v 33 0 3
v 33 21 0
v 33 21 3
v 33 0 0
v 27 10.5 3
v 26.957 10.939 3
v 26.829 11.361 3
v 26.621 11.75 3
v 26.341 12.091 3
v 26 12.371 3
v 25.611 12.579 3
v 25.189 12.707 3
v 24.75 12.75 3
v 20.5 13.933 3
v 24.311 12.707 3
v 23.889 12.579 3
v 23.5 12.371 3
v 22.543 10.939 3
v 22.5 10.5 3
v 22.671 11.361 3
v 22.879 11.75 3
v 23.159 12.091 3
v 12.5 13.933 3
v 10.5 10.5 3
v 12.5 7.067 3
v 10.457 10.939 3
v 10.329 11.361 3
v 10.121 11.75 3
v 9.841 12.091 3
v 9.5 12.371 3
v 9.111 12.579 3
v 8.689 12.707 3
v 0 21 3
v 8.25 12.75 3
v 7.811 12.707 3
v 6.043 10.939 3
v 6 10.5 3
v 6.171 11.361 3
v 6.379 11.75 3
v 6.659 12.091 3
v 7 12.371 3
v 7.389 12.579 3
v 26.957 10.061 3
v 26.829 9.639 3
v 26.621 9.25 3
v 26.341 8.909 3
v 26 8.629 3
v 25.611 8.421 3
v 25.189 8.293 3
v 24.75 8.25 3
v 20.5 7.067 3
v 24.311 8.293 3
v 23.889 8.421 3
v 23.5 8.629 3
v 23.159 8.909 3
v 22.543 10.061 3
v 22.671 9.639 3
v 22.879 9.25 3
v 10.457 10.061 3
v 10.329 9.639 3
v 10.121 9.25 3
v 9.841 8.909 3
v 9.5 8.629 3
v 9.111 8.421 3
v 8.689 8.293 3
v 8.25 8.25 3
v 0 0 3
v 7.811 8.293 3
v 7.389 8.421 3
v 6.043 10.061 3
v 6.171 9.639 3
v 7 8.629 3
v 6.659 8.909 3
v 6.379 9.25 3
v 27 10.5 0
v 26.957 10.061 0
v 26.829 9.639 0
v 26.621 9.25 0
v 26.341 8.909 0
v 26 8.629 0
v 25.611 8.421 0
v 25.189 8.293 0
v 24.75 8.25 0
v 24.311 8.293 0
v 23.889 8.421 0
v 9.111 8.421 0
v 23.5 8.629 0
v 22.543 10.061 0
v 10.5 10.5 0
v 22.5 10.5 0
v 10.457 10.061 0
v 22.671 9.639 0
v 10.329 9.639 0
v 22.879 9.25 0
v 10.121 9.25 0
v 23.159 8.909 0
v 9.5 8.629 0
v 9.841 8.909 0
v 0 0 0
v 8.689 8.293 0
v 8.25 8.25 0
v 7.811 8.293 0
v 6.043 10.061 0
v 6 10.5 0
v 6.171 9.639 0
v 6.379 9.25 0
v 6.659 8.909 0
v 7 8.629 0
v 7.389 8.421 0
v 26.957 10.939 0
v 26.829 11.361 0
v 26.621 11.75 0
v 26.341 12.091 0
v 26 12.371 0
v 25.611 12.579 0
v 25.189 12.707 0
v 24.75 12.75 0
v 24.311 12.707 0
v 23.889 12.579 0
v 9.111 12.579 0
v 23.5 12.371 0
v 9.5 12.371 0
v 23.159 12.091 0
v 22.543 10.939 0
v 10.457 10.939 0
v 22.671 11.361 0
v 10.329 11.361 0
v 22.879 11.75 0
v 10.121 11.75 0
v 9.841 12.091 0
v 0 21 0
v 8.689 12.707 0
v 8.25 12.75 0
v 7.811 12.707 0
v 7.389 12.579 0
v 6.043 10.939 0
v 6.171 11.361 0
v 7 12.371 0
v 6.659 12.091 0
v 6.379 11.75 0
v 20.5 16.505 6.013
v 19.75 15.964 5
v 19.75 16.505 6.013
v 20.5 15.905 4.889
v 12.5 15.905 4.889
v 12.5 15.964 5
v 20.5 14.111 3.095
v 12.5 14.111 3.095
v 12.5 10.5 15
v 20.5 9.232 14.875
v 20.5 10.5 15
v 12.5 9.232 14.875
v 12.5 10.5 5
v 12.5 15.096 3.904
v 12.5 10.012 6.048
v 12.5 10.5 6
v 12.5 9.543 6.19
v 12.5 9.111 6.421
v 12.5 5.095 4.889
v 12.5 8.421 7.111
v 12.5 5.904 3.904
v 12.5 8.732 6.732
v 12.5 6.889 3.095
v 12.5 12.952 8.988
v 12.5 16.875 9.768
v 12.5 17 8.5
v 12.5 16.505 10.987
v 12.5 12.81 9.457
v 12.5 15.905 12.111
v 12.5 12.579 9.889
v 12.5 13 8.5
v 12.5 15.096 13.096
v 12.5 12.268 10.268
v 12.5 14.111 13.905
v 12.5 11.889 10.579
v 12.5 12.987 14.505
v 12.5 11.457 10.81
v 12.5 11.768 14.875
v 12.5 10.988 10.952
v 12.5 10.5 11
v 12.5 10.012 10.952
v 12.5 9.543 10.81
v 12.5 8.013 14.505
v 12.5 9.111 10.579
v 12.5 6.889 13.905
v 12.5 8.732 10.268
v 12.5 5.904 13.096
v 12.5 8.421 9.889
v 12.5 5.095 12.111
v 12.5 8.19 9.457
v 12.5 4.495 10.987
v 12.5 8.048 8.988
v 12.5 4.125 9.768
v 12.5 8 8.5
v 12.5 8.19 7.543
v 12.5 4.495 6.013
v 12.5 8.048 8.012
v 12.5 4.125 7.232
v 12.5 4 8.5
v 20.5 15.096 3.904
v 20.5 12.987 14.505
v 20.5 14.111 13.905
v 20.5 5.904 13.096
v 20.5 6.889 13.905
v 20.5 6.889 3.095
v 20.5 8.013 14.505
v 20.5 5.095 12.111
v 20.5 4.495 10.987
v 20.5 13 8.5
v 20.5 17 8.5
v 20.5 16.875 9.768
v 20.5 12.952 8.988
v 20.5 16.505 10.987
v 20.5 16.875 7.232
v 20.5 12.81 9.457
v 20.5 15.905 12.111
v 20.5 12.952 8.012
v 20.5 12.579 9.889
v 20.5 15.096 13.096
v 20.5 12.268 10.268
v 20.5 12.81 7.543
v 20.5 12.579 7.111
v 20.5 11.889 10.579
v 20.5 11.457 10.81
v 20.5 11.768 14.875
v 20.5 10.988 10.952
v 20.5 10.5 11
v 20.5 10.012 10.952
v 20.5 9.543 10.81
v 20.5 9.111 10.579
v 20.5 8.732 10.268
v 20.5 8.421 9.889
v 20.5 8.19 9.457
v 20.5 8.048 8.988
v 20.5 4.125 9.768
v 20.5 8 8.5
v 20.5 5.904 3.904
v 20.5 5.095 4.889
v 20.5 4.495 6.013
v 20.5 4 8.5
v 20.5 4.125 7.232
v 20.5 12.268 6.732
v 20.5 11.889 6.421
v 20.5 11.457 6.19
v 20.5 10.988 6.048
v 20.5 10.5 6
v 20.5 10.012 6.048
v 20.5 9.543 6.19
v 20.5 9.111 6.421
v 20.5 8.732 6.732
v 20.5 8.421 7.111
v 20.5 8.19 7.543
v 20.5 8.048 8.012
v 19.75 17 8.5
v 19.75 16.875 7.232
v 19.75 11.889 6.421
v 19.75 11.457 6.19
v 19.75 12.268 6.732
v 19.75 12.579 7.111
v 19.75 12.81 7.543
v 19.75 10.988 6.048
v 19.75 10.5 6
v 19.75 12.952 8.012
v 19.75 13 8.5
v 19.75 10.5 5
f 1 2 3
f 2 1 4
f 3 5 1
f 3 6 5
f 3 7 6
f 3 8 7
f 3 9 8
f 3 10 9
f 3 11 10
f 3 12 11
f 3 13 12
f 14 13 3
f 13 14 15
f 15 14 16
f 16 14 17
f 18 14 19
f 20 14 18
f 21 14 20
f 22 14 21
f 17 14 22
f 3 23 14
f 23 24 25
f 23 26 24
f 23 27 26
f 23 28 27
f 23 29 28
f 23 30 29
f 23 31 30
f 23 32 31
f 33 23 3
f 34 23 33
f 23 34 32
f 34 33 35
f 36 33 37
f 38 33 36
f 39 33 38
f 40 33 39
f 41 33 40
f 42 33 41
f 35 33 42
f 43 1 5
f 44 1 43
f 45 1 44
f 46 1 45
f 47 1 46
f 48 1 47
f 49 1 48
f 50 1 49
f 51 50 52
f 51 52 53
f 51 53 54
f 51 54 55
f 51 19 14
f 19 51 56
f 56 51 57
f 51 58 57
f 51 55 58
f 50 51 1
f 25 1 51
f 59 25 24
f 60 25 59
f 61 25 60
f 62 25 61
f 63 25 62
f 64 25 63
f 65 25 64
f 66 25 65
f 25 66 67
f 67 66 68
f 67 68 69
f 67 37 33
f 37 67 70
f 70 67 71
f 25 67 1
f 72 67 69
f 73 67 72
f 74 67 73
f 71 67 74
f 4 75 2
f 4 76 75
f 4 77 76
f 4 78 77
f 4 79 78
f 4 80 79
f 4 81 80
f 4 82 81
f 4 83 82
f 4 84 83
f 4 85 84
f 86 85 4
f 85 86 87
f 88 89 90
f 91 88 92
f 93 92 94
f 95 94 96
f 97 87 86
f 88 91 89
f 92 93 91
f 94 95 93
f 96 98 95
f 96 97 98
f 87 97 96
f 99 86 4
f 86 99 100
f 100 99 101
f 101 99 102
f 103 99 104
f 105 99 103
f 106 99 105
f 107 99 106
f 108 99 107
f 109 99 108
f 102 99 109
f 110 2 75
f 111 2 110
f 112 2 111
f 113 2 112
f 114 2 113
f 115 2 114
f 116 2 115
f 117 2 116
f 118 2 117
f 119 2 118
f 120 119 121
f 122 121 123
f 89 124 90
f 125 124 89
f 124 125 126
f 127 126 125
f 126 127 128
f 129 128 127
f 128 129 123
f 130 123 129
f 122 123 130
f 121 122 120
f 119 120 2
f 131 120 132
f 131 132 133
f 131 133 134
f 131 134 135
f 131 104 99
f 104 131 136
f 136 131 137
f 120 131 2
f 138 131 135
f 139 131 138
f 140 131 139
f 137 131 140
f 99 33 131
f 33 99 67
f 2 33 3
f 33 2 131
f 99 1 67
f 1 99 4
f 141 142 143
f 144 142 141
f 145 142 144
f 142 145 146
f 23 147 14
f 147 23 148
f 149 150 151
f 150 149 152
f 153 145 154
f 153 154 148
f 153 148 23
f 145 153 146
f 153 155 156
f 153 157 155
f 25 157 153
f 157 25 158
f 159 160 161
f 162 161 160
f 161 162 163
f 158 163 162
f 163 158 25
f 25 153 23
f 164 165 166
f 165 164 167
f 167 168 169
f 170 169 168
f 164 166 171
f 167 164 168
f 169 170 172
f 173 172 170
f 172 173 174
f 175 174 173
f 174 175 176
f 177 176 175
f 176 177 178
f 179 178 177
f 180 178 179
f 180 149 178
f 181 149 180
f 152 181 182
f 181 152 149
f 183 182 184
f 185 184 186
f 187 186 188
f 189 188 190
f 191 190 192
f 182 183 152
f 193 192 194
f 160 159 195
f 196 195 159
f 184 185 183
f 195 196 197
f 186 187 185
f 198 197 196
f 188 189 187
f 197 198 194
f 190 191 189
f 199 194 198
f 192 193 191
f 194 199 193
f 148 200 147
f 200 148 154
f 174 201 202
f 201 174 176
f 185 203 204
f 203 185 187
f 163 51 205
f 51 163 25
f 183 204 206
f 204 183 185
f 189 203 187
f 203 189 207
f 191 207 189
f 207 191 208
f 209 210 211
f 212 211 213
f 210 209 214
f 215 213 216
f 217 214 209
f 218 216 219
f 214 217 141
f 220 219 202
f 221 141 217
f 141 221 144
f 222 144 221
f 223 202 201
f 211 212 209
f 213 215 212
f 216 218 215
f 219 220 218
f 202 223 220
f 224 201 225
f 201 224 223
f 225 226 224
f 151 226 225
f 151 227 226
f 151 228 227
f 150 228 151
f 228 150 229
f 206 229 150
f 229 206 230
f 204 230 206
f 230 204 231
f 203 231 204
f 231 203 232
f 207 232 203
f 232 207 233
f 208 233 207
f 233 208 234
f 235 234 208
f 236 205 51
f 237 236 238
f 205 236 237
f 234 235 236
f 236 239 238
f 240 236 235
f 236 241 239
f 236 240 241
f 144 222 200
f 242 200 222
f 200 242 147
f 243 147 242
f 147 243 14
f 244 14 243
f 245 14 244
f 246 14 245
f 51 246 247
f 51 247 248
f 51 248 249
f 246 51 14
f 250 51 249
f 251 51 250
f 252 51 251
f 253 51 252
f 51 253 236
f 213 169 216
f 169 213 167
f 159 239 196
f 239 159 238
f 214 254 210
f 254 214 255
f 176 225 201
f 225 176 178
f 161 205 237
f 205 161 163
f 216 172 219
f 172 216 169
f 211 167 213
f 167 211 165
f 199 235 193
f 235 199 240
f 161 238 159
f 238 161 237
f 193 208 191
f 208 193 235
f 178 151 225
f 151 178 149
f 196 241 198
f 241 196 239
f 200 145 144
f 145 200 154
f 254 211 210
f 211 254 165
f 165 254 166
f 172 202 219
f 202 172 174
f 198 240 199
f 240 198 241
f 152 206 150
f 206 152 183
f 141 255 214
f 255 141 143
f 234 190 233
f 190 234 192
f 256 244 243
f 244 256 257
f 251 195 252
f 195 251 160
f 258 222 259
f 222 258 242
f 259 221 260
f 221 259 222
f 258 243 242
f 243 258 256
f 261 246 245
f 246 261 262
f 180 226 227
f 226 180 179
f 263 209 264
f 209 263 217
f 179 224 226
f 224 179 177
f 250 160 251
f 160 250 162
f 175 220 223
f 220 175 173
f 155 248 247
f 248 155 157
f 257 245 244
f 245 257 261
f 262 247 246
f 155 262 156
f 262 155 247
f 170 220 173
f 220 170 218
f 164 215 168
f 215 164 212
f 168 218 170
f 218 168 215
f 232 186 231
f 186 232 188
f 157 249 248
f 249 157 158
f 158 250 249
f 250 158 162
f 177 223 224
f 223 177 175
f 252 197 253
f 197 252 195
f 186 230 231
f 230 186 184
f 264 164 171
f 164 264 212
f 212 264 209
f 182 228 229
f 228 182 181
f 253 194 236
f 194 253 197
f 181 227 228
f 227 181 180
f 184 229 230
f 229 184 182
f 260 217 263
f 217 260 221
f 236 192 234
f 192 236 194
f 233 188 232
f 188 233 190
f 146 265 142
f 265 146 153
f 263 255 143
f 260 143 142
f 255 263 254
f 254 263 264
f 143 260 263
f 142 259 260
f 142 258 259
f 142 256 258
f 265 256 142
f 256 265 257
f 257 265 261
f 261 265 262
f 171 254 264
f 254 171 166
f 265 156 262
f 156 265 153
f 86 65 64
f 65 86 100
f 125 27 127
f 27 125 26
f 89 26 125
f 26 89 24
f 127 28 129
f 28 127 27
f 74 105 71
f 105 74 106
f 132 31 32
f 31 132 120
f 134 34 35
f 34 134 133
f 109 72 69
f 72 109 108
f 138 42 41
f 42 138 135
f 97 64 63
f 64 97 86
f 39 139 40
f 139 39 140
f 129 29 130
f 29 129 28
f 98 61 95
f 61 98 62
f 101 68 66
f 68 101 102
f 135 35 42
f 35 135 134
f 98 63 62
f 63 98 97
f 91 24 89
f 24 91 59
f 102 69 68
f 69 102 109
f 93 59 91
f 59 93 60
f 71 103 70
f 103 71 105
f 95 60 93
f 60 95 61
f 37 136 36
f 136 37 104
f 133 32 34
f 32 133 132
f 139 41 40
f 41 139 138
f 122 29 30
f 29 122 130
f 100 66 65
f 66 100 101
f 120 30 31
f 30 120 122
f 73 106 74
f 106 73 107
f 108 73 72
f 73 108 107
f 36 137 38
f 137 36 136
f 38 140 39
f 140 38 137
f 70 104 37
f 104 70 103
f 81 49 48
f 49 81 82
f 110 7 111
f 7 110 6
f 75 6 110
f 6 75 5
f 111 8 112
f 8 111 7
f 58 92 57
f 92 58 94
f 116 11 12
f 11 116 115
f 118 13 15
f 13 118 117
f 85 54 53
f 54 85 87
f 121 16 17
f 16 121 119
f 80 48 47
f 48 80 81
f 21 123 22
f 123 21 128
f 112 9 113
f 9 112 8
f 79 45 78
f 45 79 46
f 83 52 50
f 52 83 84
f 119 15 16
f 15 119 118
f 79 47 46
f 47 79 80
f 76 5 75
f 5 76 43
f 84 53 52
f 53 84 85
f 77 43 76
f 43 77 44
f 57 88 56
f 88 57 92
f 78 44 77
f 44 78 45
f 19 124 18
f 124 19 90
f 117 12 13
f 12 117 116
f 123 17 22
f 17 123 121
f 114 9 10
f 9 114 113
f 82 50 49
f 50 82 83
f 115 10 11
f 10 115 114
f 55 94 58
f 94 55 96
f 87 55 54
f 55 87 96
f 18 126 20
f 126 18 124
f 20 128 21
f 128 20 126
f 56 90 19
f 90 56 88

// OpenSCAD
$fn = 32;

// ----------------------------------------------------------------------
// Cable clip: cable 5 mm, clamp 13 mm, base 33 mm
// ----------------------------------------------------------------------

// --- parameters (mm) ---
base_w = 33;              // base length, X
base_d = 21;              // base width, Y
base_t = 3;               // base thickness
clamp_d = 13;             // clamp outside diameter
wall_t = 4;               // clamp wall
cable_d = 5;              // cable opening
ring_w = 8;               // clamp width along the cable
screw_d = 4.5;            // screw clearance
throat = 3.5;             // snap throat width
sink = 1;                 // overlap of the clamp into the base

module base() {
  cube([base_w, base_d, base_t]);
}

module clamp() {
  translate([base_w / 2, base_d / 2, base_t + clamp_d / 2 - sink]) rotate([0, 90, 0])
    cylinder(h = ring_w, d = clamp_d, center = true);
}

difference() {
  union() {
    base();
    clamp();
  }
  translate([base_w / 2, base_d / 2, base_t + clamp_d / 2 - sink]) rotate([0, 90, 0]) translate([0, 0, -ring_w / 2 - 1]) cylinder(h = ring_w + 2, d = cable_d);
  /* snap throat: the opening is narrower than the cable */
  translate([base_w / 2 - throat / 2, base_d / 2, base_t + clamp_d / 2 - sink]) rotate([0, 90, 0]) translate([0, 0, -ring_w / 2 - 1]) cube([throat, clamp_d + 2, ring_w + 2]);
  translate([8.25, base_d / 2, -1]) cylinder(h = base_t + 2, d = screw_d);
  translate([24.75, base_d / 2, -1]) cylinder(h = base_t + 2, d = screw_d);
}
